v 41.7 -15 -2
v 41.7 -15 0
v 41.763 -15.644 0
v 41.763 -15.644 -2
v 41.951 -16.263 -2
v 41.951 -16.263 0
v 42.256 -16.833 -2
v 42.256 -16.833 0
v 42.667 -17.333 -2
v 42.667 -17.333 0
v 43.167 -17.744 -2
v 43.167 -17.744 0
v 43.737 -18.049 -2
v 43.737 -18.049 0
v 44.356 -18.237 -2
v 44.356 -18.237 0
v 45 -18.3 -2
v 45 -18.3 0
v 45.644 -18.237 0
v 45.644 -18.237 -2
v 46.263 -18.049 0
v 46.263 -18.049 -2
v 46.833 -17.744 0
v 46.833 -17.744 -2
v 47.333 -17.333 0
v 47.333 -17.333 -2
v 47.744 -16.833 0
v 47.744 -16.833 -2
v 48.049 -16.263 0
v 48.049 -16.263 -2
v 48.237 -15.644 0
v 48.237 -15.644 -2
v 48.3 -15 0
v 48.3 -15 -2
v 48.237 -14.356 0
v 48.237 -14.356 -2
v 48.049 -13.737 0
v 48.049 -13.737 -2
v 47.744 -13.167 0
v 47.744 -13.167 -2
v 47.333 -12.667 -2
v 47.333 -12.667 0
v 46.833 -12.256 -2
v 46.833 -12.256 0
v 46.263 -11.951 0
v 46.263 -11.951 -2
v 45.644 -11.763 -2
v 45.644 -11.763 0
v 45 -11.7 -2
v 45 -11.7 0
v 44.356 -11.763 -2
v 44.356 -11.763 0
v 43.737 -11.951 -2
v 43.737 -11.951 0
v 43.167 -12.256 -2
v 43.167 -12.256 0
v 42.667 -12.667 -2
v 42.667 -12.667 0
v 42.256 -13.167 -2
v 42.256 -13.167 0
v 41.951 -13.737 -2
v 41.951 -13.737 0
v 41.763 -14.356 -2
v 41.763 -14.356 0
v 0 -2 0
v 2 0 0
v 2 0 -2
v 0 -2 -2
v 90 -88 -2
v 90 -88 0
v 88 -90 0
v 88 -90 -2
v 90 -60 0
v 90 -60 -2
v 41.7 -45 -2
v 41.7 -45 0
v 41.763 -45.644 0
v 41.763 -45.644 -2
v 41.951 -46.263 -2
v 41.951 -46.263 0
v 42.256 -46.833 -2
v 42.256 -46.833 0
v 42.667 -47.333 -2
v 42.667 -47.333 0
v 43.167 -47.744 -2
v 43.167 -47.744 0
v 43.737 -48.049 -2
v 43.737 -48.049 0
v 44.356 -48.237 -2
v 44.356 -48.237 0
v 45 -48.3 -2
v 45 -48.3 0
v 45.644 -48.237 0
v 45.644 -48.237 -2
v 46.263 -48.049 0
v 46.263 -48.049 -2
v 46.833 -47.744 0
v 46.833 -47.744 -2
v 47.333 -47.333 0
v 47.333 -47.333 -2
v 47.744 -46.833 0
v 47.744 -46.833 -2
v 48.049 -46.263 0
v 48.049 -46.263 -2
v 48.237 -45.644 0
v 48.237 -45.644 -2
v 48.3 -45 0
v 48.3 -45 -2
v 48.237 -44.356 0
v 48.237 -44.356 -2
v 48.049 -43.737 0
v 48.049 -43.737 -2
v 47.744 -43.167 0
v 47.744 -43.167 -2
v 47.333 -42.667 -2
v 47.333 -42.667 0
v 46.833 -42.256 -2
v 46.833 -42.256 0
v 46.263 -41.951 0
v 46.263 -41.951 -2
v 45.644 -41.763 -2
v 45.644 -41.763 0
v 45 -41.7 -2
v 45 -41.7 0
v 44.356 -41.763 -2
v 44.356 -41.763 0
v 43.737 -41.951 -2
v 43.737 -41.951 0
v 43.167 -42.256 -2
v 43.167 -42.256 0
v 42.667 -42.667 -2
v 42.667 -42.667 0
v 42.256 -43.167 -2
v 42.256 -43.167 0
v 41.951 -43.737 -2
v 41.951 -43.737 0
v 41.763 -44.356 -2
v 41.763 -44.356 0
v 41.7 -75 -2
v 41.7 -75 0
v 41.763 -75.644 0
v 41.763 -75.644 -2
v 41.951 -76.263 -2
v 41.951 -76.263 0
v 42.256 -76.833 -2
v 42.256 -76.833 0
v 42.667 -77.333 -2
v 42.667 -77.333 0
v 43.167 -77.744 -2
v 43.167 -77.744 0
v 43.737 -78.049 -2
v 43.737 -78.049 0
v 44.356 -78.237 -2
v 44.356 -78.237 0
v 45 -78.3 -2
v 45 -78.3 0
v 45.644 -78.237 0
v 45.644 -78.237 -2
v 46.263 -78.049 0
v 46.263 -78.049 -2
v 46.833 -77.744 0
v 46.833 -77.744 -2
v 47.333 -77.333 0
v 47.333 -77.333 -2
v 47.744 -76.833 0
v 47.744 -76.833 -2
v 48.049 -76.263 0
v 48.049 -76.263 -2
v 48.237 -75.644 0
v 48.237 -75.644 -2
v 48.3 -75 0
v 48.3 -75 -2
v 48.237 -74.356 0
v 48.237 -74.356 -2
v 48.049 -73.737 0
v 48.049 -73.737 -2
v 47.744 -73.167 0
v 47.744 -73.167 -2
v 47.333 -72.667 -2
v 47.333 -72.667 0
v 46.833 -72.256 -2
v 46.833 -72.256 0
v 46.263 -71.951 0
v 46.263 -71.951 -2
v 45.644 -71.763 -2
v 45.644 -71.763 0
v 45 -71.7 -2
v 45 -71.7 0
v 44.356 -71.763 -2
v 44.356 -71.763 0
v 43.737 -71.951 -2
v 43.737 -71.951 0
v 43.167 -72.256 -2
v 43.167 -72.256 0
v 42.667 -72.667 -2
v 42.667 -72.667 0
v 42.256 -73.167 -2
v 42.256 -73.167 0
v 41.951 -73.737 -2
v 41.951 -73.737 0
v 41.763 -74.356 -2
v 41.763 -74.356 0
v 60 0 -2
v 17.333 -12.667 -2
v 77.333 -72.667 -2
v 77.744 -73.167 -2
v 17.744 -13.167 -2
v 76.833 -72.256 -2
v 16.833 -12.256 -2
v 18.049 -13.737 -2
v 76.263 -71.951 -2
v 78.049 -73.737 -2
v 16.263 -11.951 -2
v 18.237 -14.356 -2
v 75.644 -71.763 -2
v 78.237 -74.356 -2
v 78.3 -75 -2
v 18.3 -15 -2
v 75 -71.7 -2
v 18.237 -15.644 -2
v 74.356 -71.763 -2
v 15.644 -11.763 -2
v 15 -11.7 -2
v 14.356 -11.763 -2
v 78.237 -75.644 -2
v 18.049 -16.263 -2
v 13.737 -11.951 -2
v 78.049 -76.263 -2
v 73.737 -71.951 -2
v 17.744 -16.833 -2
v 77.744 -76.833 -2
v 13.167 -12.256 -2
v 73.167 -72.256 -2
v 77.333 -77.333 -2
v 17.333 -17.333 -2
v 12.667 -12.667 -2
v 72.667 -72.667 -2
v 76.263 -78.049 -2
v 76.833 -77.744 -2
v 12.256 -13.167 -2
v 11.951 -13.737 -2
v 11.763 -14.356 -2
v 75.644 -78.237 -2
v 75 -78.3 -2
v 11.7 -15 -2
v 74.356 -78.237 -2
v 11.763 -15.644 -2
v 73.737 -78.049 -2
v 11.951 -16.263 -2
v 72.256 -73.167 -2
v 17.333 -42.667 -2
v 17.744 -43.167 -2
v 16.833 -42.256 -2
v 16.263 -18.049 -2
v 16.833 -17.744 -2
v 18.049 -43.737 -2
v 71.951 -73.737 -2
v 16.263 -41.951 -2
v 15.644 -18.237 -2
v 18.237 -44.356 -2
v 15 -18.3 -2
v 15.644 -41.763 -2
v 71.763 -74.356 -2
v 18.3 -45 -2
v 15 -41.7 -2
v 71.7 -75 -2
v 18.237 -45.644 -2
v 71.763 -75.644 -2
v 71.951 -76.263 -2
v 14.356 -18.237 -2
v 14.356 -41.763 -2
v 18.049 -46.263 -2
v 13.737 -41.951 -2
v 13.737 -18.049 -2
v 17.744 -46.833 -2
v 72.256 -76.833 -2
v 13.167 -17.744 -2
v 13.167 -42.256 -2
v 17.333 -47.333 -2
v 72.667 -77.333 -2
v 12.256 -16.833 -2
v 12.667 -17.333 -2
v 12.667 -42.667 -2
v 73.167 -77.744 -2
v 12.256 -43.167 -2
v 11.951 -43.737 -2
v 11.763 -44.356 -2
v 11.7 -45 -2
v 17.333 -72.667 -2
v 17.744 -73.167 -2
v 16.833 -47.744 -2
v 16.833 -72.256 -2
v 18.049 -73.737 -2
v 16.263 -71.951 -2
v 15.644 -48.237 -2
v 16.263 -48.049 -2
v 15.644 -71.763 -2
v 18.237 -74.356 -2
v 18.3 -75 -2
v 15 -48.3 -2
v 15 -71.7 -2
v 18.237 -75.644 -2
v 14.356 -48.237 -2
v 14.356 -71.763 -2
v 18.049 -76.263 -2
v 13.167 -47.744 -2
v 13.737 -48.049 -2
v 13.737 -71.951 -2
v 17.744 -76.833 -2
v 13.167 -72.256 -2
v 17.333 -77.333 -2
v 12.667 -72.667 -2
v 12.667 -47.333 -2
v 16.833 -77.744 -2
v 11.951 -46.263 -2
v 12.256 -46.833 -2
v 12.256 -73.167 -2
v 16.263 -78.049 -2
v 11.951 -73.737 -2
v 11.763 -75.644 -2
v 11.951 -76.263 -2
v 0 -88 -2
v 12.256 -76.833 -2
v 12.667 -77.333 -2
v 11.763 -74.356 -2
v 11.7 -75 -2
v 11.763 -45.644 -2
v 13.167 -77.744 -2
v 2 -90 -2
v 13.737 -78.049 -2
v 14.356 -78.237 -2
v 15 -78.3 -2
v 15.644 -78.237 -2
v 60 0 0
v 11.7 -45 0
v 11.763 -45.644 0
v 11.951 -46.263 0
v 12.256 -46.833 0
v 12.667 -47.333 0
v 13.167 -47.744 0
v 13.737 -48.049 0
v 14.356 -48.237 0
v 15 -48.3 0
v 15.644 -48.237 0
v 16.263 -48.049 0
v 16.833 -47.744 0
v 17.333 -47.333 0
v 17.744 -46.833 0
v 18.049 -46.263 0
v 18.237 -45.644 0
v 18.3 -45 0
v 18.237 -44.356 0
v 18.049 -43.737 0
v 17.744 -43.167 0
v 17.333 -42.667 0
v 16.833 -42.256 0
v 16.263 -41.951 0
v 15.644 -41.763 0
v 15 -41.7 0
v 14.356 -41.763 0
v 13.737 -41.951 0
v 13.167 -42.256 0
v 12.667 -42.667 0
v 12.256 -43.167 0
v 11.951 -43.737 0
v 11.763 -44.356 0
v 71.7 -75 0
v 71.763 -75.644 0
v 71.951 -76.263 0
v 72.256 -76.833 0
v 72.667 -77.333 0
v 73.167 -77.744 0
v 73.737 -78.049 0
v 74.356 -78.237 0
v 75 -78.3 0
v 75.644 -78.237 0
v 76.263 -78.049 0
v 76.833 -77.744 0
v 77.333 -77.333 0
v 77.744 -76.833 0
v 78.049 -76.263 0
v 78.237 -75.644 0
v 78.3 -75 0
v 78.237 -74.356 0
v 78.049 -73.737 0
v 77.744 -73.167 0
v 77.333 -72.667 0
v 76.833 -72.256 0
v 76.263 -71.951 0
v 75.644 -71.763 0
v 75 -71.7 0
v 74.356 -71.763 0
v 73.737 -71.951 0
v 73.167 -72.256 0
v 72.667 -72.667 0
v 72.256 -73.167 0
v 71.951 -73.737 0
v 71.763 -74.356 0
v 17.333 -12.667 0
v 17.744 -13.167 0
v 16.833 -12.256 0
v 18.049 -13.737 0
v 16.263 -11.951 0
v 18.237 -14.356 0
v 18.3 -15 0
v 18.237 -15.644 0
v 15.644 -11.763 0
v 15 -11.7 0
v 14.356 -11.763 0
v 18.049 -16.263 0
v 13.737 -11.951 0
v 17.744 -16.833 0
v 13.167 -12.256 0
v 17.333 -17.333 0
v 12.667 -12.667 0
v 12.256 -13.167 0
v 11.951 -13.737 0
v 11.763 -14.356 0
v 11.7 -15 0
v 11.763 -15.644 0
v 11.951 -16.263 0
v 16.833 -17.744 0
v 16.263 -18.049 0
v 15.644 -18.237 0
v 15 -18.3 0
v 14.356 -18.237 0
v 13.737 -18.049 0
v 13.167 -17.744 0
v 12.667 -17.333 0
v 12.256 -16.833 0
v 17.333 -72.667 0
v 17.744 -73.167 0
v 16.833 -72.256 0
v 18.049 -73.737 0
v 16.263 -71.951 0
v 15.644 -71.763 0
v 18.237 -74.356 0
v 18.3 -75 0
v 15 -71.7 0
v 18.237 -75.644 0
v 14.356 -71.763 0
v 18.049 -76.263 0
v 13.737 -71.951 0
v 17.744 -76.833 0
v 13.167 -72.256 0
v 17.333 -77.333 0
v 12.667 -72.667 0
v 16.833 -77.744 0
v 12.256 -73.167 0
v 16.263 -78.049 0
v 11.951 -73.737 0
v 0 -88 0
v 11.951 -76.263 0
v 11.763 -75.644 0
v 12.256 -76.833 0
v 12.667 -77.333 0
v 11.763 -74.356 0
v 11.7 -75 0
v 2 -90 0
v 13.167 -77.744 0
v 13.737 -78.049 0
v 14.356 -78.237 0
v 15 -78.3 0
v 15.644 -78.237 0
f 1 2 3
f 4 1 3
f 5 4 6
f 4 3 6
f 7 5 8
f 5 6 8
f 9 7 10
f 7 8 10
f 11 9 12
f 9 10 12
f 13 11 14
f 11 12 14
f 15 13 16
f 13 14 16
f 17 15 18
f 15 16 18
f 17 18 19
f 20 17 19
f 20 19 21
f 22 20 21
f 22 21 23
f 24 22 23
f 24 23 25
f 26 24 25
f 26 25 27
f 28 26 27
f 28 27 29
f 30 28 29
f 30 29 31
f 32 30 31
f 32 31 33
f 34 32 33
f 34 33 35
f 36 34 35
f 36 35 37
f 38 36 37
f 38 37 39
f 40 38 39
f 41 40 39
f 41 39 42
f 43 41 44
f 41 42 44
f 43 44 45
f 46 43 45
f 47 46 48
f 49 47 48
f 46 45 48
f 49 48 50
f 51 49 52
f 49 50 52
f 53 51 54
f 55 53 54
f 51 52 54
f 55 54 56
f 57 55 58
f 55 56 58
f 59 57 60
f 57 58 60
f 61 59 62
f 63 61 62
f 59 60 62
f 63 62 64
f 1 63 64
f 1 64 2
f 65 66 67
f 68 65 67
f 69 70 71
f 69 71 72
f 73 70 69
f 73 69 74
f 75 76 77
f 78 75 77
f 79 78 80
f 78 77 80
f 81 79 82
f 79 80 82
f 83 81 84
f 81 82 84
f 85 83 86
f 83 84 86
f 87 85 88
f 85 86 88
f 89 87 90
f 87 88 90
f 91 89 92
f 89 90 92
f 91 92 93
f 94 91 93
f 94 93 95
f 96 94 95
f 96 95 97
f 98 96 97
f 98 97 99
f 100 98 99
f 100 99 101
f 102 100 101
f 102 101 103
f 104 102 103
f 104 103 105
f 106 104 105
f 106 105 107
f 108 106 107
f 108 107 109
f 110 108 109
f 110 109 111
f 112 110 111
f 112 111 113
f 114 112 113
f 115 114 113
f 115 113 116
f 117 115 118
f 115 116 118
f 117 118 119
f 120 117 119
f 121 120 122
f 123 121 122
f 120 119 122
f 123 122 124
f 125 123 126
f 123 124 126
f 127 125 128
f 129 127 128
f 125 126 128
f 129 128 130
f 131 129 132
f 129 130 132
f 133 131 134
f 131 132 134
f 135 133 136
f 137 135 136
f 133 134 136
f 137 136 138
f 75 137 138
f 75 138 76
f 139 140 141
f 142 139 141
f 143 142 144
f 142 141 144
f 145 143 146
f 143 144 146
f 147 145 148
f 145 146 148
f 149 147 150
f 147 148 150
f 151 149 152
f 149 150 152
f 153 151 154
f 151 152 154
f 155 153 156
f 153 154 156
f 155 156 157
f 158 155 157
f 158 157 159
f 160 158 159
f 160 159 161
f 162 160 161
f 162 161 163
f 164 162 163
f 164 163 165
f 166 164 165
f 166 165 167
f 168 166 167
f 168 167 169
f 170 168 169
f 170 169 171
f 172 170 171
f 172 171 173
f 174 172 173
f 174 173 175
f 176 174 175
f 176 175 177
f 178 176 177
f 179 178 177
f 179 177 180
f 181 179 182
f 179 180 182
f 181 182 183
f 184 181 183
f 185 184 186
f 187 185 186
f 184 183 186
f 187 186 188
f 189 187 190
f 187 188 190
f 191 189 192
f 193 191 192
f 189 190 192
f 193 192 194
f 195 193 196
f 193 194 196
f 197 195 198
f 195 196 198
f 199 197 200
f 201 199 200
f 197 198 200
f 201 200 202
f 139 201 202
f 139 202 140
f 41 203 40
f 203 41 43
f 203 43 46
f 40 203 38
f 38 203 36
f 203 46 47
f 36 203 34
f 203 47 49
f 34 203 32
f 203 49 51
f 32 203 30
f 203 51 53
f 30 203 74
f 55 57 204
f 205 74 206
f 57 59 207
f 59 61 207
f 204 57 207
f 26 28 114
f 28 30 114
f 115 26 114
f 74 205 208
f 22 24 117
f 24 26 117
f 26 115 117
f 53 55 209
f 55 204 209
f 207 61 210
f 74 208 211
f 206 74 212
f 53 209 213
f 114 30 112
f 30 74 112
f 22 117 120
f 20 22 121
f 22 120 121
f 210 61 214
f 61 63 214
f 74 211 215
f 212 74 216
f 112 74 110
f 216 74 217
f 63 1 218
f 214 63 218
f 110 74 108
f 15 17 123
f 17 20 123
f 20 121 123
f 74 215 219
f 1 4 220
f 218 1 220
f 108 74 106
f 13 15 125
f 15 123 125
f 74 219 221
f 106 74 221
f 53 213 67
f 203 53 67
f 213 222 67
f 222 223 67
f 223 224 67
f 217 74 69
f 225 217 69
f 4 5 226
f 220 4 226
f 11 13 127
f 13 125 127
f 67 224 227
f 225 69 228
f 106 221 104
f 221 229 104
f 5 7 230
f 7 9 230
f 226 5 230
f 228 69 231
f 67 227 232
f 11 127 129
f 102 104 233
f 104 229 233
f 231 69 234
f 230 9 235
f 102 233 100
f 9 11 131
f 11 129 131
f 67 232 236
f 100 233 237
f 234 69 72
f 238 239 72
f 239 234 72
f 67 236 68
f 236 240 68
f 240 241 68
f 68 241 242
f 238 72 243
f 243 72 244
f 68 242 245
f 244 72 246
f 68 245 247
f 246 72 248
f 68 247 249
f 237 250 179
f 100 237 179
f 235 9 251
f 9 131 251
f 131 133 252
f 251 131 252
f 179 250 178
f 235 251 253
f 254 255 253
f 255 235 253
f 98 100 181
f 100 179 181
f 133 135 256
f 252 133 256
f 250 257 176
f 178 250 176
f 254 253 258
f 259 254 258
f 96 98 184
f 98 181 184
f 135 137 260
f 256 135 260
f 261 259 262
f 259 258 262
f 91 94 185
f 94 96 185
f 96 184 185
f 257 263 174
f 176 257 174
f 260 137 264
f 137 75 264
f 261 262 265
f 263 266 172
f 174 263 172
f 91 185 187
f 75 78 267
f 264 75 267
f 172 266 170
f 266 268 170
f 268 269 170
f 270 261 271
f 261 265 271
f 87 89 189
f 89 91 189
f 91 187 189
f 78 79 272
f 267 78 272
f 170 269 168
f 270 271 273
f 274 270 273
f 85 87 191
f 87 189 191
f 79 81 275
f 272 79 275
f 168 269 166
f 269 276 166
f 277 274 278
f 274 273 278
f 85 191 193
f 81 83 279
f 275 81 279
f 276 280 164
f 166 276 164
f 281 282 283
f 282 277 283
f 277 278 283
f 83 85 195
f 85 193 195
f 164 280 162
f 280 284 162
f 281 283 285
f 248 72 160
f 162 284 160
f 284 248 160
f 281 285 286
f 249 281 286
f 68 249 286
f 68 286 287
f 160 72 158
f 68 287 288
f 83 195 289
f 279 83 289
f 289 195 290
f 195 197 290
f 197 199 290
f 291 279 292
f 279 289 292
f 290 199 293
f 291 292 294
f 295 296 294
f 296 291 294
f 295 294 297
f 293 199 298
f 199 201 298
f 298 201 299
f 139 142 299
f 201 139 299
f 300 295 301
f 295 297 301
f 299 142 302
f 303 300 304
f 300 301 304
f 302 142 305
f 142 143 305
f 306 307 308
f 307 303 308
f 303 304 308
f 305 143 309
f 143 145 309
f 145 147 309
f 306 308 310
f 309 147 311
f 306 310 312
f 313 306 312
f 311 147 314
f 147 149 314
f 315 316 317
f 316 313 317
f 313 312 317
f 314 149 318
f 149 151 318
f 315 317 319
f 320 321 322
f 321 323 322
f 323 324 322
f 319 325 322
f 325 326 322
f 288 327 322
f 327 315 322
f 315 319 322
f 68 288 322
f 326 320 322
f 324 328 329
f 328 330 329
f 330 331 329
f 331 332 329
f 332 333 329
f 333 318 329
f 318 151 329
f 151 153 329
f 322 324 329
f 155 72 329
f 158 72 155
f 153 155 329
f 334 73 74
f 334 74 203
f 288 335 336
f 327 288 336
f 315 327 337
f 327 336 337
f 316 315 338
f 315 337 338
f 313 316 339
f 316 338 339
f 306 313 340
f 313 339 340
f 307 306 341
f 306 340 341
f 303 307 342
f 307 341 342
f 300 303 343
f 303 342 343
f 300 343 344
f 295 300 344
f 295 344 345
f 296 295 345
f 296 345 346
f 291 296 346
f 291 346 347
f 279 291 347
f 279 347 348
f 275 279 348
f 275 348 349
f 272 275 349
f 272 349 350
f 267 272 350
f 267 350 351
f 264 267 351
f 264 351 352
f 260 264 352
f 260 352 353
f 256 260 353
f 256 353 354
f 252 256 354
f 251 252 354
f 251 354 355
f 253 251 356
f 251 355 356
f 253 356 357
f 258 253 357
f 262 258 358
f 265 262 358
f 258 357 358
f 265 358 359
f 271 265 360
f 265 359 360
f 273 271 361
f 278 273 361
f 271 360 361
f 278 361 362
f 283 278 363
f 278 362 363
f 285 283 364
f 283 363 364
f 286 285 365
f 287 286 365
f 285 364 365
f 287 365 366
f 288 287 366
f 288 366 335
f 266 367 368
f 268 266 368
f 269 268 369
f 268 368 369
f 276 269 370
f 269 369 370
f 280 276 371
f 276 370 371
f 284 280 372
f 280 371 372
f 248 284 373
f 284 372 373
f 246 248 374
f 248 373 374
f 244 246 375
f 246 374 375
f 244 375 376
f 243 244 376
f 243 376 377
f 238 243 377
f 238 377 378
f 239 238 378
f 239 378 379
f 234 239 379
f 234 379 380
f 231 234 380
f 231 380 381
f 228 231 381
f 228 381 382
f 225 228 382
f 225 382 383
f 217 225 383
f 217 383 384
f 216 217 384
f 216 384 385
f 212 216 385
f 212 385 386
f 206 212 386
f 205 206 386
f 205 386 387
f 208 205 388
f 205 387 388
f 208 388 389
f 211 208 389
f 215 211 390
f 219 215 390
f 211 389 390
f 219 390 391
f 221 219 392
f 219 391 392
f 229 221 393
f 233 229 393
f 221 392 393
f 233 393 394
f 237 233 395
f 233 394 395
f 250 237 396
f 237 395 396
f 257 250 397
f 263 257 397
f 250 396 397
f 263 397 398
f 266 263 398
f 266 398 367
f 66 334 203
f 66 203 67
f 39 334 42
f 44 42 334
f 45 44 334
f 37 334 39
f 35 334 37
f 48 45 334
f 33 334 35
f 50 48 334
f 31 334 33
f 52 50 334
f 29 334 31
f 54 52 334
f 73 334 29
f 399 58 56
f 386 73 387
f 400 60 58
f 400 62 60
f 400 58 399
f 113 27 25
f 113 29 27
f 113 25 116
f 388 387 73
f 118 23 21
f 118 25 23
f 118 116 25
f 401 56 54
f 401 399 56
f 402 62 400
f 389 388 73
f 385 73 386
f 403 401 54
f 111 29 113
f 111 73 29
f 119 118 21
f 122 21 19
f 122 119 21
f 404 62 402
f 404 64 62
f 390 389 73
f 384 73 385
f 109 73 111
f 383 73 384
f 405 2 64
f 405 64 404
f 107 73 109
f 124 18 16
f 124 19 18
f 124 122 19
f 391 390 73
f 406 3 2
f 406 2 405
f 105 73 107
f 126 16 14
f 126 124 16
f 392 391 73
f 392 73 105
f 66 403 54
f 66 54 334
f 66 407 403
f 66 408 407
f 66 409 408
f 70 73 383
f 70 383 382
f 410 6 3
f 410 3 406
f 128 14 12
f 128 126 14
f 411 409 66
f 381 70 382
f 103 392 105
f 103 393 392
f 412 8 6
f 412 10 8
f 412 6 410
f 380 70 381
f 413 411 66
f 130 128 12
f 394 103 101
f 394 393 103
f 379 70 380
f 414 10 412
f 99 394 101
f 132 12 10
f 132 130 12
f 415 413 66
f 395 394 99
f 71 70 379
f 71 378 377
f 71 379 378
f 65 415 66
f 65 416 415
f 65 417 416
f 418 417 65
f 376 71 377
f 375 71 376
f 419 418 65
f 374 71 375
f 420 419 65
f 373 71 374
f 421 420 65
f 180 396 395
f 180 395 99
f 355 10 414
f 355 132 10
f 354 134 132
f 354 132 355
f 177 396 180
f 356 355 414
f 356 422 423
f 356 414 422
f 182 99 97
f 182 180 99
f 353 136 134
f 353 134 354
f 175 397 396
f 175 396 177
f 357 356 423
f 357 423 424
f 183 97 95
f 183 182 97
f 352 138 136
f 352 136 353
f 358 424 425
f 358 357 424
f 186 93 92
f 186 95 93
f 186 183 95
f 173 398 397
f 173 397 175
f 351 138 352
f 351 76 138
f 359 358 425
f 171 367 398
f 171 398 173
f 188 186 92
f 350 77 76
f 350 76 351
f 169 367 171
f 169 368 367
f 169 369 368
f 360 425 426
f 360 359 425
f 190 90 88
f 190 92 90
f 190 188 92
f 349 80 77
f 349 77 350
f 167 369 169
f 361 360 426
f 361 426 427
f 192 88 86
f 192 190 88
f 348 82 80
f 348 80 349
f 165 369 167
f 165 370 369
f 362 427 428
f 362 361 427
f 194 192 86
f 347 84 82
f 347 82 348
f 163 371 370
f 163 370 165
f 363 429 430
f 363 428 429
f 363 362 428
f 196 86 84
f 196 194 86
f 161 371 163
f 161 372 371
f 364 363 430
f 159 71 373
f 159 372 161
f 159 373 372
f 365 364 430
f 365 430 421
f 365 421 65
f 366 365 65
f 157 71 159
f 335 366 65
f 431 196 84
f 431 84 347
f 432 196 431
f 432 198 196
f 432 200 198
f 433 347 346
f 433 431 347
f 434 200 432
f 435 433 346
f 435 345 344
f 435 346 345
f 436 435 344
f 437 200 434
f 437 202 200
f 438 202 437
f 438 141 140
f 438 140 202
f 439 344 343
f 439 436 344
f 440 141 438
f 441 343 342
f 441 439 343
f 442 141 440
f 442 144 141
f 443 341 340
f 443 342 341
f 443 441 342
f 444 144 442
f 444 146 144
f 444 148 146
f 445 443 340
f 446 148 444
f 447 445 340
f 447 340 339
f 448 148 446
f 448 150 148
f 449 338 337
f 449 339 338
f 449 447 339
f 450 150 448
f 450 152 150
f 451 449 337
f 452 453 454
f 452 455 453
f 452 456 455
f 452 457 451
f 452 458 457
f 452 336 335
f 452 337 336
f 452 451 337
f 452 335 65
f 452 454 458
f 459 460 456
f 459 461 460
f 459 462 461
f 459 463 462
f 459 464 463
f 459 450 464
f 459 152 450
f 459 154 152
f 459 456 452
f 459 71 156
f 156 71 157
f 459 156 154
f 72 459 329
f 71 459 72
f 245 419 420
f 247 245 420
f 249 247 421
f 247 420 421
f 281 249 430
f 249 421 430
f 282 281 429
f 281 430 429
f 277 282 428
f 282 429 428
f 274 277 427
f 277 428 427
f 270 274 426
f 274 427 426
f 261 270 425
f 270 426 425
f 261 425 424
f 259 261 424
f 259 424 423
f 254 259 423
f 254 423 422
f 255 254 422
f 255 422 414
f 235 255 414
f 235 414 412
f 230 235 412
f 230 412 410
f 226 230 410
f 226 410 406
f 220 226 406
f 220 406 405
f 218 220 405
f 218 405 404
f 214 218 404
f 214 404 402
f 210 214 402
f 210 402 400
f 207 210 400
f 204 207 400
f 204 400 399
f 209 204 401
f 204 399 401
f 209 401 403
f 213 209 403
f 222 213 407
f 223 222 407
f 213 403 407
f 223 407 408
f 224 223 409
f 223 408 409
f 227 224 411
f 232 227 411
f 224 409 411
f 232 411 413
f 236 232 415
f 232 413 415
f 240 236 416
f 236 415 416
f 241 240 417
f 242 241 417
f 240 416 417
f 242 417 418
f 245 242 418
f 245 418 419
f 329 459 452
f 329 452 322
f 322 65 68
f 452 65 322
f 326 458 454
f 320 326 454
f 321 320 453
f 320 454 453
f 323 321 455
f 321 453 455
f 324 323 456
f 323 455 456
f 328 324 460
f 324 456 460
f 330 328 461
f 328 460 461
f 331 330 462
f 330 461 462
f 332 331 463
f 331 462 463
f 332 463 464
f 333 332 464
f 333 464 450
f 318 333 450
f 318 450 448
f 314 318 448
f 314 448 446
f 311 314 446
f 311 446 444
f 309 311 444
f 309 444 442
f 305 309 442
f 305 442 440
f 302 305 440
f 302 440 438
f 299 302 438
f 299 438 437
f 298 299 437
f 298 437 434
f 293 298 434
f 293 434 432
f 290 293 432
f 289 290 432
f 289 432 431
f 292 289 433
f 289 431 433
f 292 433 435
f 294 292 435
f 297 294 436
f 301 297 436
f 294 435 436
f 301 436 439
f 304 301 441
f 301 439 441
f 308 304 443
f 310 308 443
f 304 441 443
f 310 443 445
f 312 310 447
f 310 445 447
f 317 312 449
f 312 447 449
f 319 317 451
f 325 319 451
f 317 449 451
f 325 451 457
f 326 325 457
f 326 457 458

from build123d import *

# Parameters (mm, degrees)
EXTRUDE_1_DEPTH   = 2
HOLE_WIZARD_M61_D = 6.6
CHAMFER_1_SIZE    = 2


with BuildPart() as part:
    # Эскиз1 → Бобышка-Вытянуть1 (new body)
    with BuildSketch(Plane(origin=(0, 0, 0), x_dir=(1, 0, 0), z_dir=(0, 0, -1))):
        Polygon((0, 0), (0, 90), (90, 90), (90, 60), (60, 0), align=None)
    extrude(amount=EXTRUDE_1_DEPTH)

    # Отверстие с зазором M61 (through all)
    with Locations(Plane(origin=(0, 0, -2), x_dir=(1, 0, 0), z_dir=(0, 0, -1))):
        with Locations((45, 75), (15, 75), (15, 45), (15, 15), (75, 75), (45, 45), (45, 15)):
            Hole(HOLE_WIZARD_M61_D / 2)

    # Фаска1
    chamfer_1_edges = [part.edges().sort_by_distance(p)[0] for p in [
        (0, 0, -1),
        (0, -90, -1),
        (90, -90, -1),
    ]]
    chamfer(chamfer_1_edges, length=CHAMFER_1_SIZE)


solid = part.part
